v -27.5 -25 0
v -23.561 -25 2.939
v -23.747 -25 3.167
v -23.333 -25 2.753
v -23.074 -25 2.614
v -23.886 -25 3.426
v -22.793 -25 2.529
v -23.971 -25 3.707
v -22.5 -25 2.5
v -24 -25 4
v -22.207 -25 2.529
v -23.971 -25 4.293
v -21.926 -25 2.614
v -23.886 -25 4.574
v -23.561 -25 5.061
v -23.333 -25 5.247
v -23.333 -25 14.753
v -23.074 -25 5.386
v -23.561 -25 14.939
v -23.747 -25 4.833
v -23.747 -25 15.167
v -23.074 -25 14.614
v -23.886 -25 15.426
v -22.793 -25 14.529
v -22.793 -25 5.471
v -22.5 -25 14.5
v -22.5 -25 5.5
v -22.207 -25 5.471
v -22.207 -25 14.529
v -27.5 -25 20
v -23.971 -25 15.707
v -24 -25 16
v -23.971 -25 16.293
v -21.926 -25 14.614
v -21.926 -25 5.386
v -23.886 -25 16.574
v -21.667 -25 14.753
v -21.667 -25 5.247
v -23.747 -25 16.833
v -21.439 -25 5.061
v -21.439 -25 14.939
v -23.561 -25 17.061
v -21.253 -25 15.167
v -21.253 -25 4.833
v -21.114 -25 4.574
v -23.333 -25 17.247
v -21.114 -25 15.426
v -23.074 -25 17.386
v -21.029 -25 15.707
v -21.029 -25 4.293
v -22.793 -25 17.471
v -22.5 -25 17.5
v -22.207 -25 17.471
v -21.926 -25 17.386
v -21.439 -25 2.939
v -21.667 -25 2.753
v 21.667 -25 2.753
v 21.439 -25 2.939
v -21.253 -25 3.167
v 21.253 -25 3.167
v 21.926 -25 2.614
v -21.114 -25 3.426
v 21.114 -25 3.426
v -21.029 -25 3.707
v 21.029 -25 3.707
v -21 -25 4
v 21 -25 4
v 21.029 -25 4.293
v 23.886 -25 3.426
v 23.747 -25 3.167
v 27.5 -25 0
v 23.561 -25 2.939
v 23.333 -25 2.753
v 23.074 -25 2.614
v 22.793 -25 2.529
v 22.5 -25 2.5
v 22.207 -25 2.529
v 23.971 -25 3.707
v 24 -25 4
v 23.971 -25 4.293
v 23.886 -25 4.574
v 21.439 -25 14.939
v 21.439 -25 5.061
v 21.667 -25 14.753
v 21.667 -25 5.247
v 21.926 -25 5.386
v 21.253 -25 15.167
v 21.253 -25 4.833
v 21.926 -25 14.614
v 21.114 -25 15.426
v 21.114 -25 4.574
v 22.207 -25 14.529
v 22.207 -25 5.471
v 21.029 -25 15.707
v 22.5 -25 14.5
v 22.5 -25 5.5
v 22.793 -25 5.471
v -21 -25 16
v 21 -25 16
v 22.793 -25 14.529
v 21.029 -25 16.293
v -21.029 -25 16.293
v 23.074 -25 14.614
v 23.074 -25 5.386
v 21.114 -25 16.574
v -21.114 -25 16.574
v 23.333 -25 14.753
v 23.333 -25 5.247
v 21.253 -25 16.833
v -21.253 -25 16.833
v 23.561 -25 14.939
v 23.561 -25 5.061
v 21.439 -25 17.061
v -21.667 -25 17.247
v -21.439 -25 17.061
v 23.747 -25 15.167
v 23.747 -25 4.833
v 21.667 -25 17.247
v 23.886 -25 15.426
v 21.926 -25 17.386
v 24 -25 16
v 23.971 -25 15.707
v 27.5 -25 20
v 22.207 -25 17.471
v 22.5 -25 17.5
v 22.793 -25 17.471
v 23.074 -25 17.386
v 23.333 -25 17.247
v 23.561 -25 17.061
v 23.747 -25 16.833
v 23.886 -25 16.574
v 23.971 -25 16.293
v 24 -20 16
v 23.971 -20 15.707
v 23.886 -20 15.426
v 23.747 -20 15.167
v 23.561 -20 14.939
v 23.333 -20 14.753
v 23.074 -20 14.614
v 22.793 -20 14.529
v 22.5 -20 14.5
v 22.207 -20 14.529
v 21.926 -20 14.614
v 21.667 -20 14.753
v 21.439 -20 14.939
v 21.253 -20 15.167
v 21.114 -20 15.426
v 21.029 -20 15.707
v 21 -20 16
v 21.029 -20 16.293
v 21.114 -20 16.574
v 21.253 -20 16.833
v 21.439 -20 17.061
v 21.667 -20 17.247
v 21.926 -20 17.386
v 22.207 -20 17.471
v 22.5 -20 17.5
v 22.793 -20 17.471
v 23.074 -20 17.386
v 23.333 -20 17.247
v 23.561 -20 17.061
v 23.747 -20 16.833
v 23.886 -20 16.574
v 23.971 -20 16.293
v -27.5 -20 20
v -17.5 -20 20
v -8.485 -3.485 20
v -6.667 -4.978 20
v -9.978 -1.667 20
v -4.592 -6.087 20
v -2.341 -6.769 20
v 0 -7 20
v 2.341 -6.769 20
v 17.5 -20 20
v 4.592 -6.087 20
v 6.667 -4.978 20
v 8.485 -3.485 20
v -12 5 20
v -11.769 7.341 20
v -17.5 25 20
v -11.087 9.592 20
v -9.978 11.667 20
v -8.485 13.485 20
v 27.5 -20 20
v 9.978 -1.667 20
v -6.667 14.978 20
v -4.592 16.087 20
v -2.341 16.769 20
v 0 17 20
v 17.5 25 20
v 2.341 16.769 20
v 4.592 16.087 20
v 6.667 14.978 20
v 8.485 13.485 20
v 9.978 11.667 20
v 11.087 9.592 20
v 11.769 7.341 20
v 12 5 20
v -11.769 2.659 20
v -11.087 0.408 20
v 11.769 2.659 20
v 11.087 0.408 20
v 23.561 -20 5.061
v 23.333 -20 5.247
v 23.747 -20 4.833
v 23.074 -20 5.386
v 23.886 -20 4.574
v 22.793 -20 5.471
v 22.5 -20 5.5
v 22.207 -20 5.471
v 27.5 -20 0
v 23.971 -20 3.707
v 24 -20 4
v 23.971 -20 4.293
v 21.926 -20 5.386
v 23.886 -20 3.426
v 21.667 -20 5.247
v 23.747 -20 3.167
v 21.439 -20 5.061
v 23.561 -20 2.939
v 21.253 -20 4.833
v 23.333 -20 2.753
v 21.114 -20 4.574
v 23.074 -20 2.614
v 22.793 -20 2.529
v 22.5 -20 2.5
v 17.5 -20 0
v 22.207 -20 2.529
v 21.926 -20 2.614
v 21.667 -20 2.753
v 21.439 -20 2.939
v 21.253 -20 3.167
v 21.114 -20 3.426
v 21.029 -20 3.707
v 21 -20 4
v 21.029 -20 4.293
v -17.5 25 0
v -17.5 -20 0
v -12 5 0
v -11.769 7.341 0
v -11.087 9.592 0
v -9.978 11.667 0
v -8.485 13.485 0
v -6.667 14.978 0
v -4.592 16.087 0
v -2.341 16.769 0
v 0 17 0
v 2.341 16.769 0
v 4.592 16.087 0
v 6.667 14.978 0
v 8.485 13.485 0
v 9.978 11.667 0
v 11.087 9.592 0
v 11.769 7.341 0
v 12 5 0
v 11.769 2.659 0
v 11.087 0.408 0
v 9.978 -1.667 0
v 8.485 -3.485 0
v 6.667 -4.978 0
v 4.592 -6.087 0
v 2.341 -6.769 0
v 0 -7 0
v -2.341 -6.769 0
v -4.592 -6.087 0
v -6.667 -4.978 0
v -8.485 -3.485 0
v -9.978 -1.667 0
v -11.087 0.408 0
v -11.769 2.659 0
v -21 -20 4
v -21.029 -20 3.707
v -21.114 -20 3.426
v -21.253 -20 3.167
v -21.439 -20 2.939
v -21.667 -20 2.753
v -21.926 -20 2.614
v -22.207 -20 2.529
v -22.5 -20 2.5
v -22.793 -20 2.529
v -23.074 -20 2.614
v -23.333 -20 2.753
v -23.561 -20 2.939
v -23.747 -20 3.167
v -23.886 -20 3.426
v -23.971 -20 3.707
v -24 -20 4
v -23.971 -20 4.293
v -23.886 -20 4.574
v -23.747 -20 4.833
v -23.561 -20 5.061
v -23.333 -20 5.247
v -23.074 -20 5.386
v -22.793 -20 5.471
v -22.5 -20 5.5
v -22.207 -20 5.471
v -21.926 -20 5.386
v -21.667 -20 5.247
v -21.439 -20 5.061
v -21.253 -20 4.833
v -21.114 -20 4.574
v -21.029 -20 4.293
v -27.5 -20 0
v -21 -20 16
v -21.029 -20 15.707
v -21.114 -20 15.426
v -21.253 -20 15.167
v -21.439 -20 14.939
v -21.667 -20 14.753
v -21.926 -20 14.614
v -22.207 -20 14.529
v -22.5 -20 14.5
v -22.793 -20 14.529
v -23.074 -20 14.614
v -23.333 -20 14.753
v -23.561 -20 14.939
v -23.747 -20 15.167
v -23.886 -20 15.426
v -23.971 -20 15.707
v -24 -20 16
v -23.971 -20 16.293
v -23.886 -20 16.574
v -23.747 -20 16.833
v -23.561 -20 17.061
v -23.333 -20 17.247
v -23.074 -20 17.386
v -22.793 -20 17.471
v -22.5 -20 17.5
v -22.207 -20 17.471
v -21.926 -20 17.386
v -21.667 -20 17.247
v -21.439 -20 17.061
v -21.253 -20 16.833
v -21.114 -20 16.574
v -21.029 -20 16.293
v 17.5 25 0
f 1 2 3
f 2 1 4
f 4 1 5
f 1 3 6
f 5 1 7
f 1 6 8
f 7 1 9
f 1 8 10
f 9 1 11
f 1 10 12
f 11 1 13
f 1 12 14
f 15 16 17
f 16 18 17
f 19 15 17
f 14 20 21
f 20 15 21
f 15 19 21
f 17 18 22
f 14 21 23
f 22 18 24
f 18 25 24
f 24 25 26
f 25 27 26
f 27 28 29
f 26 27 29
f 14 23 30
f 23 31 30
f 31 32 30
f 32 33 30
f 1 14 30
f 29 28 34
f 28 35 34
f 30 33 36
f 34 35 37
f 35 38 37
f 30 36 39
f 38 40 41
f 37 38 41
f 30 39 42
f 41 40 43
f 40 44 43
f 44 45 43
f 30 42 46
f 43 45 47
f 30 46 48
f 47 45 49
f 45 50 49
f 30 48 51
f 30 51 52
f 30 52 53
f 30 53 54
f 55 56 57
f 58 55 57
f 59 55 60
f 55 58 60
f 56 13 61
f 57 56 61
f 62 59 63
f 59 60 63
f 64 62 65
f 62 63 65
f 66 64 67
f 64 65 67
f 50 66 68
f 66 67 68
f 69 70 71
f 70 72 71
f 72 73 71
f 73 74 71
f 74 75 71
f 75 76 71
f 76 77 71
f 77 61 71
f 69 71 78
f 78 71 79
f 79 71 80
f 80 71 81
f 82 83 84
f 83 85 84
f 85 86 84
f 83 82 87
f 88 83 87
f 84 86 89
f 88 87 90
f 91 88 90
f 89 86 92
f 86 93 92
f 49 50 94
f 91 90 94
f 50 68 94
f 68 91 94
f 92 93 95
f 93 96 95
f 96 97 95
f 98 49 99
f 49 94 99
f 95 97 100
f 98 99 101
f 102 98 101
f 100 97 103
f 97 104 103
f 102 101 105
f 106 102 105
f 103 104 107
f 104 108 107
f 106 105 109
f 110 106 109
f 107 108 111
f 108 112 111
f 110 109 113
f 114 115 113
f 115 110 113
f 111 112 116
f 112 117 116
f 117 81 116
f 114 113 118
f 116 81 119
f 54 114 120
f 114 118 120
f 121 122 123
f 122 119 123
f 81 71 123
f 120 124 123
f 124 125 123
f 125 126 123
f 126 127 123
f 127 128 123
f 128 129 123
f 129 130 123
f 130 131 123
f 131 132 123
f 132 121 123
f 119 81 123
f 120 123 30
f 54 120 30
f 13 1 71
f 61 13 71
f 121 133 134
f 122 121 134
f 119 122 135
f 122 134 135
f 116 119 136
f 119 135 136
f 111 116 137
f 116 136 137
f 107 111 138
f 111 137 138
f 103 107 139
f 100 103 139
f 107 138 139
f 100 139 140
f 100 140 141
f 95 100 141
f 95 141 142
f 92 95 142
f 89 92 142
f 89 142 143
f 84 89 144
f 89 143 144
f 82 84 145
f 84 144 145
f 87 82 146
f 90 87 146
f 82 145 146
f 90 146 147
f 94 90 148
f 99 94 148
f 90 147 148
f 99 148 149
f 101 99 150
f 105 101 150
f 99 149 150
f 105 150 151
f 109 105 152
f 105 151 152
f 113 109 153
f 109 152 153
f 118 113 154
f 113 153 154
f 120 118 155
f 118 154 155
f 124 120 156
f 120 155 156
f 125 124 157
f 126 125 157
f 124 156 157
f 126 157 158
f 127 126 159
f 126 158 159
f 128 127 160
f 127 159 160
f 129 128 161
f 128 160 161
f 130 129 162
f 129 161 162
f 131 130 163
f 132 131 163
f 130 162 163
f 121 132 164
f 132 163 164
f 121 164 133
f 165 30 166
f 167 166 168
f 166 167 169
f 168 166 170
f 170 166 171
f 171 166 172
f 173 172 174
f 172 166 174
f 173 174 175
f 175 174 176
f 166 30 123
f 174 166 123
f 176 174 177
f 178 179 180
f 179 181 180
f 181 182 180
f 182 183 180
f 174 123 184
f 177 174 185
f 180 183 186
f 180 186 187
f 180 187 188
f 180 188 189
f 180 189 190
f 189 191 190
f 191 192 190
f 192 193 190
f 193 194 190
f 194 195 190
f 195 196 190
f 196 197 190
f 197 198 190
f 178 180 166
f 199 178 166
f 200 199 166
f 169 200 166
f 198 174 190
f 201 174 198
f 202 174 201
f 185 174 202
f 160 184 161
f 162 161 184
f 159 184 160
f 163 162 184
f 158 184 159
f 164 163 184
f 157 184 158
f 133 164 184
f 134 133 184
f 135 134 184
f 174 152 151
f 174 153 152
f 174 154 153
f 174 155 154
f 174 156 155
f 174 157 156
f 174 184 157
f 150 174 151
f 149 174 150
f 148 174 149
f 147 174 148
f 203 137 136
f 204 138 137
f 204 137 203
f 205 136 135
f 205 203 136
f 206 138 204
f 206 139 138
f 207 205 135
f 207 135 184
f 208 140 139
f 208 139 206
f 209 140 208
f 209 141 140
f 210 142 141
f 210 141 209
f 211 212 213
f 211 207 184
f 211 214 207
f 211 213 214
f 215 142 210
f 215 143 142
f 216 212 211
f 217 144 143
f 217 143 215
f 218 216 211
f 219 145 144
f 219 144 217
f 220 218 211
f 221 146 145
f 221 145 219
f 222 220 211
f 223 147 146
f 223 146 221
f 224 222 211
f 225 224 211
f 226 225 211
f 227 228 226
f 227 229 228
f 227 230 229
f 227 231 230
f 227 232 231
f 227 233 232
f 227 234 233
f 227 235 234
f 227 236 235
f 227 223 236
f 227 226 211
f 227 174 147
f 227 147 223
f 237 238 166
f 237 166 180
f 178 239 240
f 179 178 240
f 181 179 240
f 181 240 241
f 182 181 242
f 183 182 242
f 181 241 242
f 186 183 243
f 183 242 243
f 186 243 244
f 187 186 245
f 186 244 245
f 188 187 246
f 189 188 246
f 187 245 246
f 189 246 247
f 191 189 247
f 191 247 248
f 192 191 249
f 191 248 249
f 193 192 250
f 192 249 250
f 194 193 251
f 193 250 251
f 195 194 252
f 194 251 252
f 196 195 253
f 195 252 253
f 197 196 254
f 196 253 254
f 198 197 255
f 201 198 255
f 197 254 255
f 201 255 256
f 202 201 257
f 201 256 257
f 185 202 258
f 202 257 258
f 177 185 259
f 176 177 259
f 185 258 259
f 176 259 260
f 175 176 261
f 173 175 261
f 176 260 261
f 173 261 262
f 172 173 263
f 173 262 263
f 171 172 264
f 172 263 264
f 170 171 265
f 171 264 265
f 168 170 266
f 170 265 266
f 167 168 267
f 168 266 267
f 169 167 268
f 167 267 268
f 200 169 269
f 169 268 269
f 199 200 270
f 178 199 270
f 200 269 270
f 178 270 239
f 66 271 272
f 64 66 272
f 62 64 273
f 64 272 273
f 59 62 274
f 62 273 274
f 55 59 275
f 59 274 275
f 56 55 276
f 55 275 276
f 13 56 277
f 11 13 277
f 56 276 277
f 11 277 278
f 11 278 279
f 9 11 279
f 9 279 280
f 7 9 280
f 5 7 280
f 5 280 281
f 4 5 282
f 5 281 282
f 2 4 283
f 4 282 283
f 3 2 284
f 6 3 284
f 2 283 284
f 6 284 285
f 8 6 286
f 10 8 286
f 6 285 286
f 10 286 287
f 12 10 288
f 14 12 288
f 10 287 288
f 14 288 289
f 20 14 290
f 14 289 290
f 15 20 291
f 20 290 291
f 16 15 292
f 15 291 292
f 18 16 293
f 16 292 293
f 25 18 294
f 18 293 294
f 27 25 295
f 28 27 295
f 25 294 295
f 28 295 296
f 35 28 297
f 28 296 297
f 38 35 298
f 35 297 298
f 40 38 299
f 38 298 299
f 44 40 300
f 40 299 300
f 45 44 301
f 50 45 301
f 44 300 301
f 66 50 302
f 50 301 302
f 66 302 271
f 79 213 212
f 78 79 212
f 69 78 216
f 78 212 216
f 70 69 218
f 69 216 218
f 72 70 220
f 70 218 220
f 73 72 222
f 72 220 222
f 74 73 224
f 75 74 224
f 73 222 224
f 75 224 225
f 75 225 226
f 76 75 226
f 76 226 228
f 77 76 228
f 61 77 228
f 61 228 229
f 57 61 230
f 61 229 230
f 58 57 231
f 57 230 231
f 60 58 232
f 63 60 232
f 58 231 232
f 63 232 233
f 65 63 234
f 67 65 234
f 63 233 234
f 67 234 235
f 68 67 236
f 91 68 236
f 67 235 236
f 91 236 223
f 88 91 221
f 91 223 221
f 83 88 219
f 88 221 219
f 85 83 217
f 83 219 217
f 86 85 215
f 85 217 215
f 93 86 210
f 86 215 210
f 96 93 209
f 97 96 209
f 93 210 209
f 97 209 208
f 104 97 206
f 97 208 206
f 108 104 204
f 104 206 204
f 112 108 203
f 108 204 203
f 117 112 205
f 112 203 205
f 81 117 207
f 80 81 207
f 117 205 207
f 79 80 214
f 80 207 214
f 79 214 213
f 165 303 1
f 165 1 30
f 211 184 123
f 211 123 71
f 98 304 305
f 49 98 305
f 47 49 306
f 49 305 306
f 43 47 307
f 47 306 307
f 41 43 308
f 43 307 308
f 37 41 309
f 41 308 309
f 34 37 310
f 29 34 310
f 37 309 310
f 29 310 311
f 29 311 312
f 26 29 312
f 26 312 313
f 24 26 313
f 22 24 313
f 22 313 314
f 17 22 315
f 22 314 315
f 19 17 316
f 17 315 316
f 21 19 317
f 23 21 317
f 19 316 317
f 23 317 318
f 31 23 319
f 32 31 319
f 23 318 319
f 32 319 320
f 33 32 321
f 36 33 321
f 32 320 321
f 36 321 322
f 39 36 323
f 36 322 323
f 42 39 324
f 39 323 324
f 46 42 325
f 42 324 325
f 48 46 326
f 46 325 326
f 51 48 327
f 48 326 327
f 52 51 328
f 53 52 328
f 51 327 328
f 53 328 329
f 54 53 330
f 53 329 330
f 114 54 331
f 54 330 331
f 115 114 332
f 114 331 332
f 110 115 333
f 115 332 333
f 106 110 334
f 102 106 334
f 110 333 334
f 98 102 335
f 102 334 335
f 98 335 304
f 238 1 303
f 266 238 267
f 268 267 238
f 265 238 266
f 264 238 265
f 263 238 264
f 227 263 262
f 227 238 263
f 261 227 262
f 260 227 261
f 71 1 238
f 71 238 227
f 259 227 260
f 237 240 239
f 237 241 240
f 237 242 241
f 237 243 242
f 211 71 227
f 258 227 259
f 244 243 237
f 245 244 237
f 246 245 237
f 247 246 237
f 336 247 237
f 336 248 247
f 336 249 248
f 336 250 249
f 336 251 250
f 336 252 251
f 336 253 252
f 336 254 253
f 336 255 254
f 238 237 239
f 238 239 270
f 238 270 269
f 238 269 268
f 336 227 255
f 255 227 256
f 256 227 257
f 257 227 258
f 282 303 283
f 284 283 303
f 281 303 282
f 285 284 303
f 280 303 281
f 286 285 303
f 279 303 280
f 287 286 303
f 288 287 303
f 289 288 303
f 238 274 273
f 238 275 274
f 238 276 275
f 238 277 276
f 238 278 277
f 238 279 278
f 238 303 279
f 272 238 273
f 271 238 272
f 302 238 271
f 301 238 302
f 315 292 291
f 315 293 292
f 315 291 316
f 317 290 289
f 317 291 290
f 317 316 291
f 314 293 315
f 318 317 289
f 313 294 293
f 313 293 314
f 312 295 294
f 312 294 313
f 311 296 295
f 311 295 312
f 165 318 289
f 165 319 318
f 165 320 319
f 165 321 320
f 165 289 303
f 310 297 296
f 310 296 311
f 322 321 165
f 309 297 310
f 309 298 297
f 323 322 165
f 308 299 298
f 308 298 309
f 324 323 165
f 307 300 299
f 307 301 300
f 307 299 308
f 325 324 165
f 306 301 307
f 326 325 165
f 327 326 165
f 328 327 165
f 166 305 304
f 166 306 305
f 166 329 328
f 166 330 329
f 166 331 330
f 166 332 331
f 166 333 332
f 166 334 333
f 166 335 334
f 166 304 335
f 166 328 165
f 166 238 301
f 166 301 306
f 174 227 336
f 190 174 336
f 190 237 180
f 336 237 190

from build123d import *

# Parameters (mm, degrees)
SKETCH_1_W          = 35
SKETCH_1_H          = 50
EXTRUDE_1_DEPTH     = 20
SKETCH_2_W          = 20
SKETCH_2_H          = 5
EXTRUDE_2_DEPTH     = 10
SKETCH_3_W          = 20
SKETCH_3_H          = 5
EXTRUDE_3_DEPTH     = 10
SKETCH_4_R          = 12
CUT_EXTRUDE_1_DEPTH = 20
SKETCH_5_R          = 1.5
CUT_EXTRUDE_2_DEPTH = 5
SKETCH_6_R          = 1.5
CUT_EXTRUDE_3_DEPTH = 5
SKETCH_7_R          = 1.5
CUT_EXTRUDE_4_DEPTH = 5
SKETCH_8_R          = 1.5
CUT_EXTRUDE_5_DEPTH = 5


with BuildPart() as part:
    # Эскиз1 → Бобышка-Вытянуть1 (new body)
    with BuildSketch(Plane.XY):
        Rectangle(SKETCH_1_W, SKETCH_1_H)
    extrude(amount=EXTRUDE_1_DEPTH)

    # Эскиз2 → Бобышка-Вытянуть2 (add)
    with BuildSketch(Plane(origin=(17.5, 0, 0), x_dir=(0, 0, -1), z_dir=(1, 0, 0))):
        with Locations((-10, -22.5)):
            Rectangle(SKETCH_2_W, SKETCH_2_H)
    extrude(amount=EXTRUDE_2_DEPTH)

    # Эскиз3 → Бобышка-Вытянуть3 (add)
    with BuildSketch(Plane.ZY.offset(17.5)):
        with Locations((10, -22.5)):
            Rectangle(SKETCH_3_W, SKETCH_3_H)
    extrude(amount=EXTRUDE_3_DEPTH)

    # Эскиз4 → Вырез-Вытянуть1 (cut)
    with BuildSketch(Plane(origin=(0, 0, 0), x_dir=(-1, 0, 0), z_dir=(0, 0, -1))):
        with Locations((0, 5)):
            Circle(SKETCH_4_R)
    extrude(amount=-CUT_EXTRUDE_1_DEPTH, mode=Mode.SUBTRACT)

    # Эскиз5 → Вырез-Вытянуть2 (cut)
    with BuildSketch(Plane(origin=(0, -20, 0), x_dir=(1, 0, 0), z_dir=(0, 1, 0))):
        with Locations((-22.5, -4)):
            Circle(SKETCH_5_R)
    extrude(amount=-CUT_EXTRUDE_2_DEPTH, mode=Mode.SUBTRACT)

    # Эскиз6 → Вырез-Вытянуть3 (cut)
    with BuildSketch(Plane(origin=(0, -20, 0), x_dir=(1, 0, 0), z_dir=(0, 1, 0))):
        with Locations((-22.5, -16)):
            Circle(SKETCH_6_R)
    extrude(amount=-CUT_EXTRUDE_3_DEPTH, mode=Mode.SUBTRACT)

    # Эскиз7 → Вырез-Вытянуть4 (cut)
    with BuildSketch(Plane(origin=(0, -20, 0), x_dir=(1, 0, 0), z_dir=(0, 1, 0))):
        with Locations((22.5, -4)):
            Circle(SKETCH_7_R)
    extrude(amount=-CUT_EXTRUDE_4_DEPTH, mode=Mode.SUBTRACT)

    # Эскиз8 → Вырез-Вытянуть5 (cut)
    with BuildSketch(Plane(origin=(0, -20, 0), x_dir=(1, 0, 0), z_dir=(0, 1, 0))):
        with Locations((22.5, -16)):
            Circle(SKETCH_8_R)
    extrude(amount=-CUT_EXTRUDE_5_DEPTH, mode=Mode.SUBTRACT)


solid = part.part
